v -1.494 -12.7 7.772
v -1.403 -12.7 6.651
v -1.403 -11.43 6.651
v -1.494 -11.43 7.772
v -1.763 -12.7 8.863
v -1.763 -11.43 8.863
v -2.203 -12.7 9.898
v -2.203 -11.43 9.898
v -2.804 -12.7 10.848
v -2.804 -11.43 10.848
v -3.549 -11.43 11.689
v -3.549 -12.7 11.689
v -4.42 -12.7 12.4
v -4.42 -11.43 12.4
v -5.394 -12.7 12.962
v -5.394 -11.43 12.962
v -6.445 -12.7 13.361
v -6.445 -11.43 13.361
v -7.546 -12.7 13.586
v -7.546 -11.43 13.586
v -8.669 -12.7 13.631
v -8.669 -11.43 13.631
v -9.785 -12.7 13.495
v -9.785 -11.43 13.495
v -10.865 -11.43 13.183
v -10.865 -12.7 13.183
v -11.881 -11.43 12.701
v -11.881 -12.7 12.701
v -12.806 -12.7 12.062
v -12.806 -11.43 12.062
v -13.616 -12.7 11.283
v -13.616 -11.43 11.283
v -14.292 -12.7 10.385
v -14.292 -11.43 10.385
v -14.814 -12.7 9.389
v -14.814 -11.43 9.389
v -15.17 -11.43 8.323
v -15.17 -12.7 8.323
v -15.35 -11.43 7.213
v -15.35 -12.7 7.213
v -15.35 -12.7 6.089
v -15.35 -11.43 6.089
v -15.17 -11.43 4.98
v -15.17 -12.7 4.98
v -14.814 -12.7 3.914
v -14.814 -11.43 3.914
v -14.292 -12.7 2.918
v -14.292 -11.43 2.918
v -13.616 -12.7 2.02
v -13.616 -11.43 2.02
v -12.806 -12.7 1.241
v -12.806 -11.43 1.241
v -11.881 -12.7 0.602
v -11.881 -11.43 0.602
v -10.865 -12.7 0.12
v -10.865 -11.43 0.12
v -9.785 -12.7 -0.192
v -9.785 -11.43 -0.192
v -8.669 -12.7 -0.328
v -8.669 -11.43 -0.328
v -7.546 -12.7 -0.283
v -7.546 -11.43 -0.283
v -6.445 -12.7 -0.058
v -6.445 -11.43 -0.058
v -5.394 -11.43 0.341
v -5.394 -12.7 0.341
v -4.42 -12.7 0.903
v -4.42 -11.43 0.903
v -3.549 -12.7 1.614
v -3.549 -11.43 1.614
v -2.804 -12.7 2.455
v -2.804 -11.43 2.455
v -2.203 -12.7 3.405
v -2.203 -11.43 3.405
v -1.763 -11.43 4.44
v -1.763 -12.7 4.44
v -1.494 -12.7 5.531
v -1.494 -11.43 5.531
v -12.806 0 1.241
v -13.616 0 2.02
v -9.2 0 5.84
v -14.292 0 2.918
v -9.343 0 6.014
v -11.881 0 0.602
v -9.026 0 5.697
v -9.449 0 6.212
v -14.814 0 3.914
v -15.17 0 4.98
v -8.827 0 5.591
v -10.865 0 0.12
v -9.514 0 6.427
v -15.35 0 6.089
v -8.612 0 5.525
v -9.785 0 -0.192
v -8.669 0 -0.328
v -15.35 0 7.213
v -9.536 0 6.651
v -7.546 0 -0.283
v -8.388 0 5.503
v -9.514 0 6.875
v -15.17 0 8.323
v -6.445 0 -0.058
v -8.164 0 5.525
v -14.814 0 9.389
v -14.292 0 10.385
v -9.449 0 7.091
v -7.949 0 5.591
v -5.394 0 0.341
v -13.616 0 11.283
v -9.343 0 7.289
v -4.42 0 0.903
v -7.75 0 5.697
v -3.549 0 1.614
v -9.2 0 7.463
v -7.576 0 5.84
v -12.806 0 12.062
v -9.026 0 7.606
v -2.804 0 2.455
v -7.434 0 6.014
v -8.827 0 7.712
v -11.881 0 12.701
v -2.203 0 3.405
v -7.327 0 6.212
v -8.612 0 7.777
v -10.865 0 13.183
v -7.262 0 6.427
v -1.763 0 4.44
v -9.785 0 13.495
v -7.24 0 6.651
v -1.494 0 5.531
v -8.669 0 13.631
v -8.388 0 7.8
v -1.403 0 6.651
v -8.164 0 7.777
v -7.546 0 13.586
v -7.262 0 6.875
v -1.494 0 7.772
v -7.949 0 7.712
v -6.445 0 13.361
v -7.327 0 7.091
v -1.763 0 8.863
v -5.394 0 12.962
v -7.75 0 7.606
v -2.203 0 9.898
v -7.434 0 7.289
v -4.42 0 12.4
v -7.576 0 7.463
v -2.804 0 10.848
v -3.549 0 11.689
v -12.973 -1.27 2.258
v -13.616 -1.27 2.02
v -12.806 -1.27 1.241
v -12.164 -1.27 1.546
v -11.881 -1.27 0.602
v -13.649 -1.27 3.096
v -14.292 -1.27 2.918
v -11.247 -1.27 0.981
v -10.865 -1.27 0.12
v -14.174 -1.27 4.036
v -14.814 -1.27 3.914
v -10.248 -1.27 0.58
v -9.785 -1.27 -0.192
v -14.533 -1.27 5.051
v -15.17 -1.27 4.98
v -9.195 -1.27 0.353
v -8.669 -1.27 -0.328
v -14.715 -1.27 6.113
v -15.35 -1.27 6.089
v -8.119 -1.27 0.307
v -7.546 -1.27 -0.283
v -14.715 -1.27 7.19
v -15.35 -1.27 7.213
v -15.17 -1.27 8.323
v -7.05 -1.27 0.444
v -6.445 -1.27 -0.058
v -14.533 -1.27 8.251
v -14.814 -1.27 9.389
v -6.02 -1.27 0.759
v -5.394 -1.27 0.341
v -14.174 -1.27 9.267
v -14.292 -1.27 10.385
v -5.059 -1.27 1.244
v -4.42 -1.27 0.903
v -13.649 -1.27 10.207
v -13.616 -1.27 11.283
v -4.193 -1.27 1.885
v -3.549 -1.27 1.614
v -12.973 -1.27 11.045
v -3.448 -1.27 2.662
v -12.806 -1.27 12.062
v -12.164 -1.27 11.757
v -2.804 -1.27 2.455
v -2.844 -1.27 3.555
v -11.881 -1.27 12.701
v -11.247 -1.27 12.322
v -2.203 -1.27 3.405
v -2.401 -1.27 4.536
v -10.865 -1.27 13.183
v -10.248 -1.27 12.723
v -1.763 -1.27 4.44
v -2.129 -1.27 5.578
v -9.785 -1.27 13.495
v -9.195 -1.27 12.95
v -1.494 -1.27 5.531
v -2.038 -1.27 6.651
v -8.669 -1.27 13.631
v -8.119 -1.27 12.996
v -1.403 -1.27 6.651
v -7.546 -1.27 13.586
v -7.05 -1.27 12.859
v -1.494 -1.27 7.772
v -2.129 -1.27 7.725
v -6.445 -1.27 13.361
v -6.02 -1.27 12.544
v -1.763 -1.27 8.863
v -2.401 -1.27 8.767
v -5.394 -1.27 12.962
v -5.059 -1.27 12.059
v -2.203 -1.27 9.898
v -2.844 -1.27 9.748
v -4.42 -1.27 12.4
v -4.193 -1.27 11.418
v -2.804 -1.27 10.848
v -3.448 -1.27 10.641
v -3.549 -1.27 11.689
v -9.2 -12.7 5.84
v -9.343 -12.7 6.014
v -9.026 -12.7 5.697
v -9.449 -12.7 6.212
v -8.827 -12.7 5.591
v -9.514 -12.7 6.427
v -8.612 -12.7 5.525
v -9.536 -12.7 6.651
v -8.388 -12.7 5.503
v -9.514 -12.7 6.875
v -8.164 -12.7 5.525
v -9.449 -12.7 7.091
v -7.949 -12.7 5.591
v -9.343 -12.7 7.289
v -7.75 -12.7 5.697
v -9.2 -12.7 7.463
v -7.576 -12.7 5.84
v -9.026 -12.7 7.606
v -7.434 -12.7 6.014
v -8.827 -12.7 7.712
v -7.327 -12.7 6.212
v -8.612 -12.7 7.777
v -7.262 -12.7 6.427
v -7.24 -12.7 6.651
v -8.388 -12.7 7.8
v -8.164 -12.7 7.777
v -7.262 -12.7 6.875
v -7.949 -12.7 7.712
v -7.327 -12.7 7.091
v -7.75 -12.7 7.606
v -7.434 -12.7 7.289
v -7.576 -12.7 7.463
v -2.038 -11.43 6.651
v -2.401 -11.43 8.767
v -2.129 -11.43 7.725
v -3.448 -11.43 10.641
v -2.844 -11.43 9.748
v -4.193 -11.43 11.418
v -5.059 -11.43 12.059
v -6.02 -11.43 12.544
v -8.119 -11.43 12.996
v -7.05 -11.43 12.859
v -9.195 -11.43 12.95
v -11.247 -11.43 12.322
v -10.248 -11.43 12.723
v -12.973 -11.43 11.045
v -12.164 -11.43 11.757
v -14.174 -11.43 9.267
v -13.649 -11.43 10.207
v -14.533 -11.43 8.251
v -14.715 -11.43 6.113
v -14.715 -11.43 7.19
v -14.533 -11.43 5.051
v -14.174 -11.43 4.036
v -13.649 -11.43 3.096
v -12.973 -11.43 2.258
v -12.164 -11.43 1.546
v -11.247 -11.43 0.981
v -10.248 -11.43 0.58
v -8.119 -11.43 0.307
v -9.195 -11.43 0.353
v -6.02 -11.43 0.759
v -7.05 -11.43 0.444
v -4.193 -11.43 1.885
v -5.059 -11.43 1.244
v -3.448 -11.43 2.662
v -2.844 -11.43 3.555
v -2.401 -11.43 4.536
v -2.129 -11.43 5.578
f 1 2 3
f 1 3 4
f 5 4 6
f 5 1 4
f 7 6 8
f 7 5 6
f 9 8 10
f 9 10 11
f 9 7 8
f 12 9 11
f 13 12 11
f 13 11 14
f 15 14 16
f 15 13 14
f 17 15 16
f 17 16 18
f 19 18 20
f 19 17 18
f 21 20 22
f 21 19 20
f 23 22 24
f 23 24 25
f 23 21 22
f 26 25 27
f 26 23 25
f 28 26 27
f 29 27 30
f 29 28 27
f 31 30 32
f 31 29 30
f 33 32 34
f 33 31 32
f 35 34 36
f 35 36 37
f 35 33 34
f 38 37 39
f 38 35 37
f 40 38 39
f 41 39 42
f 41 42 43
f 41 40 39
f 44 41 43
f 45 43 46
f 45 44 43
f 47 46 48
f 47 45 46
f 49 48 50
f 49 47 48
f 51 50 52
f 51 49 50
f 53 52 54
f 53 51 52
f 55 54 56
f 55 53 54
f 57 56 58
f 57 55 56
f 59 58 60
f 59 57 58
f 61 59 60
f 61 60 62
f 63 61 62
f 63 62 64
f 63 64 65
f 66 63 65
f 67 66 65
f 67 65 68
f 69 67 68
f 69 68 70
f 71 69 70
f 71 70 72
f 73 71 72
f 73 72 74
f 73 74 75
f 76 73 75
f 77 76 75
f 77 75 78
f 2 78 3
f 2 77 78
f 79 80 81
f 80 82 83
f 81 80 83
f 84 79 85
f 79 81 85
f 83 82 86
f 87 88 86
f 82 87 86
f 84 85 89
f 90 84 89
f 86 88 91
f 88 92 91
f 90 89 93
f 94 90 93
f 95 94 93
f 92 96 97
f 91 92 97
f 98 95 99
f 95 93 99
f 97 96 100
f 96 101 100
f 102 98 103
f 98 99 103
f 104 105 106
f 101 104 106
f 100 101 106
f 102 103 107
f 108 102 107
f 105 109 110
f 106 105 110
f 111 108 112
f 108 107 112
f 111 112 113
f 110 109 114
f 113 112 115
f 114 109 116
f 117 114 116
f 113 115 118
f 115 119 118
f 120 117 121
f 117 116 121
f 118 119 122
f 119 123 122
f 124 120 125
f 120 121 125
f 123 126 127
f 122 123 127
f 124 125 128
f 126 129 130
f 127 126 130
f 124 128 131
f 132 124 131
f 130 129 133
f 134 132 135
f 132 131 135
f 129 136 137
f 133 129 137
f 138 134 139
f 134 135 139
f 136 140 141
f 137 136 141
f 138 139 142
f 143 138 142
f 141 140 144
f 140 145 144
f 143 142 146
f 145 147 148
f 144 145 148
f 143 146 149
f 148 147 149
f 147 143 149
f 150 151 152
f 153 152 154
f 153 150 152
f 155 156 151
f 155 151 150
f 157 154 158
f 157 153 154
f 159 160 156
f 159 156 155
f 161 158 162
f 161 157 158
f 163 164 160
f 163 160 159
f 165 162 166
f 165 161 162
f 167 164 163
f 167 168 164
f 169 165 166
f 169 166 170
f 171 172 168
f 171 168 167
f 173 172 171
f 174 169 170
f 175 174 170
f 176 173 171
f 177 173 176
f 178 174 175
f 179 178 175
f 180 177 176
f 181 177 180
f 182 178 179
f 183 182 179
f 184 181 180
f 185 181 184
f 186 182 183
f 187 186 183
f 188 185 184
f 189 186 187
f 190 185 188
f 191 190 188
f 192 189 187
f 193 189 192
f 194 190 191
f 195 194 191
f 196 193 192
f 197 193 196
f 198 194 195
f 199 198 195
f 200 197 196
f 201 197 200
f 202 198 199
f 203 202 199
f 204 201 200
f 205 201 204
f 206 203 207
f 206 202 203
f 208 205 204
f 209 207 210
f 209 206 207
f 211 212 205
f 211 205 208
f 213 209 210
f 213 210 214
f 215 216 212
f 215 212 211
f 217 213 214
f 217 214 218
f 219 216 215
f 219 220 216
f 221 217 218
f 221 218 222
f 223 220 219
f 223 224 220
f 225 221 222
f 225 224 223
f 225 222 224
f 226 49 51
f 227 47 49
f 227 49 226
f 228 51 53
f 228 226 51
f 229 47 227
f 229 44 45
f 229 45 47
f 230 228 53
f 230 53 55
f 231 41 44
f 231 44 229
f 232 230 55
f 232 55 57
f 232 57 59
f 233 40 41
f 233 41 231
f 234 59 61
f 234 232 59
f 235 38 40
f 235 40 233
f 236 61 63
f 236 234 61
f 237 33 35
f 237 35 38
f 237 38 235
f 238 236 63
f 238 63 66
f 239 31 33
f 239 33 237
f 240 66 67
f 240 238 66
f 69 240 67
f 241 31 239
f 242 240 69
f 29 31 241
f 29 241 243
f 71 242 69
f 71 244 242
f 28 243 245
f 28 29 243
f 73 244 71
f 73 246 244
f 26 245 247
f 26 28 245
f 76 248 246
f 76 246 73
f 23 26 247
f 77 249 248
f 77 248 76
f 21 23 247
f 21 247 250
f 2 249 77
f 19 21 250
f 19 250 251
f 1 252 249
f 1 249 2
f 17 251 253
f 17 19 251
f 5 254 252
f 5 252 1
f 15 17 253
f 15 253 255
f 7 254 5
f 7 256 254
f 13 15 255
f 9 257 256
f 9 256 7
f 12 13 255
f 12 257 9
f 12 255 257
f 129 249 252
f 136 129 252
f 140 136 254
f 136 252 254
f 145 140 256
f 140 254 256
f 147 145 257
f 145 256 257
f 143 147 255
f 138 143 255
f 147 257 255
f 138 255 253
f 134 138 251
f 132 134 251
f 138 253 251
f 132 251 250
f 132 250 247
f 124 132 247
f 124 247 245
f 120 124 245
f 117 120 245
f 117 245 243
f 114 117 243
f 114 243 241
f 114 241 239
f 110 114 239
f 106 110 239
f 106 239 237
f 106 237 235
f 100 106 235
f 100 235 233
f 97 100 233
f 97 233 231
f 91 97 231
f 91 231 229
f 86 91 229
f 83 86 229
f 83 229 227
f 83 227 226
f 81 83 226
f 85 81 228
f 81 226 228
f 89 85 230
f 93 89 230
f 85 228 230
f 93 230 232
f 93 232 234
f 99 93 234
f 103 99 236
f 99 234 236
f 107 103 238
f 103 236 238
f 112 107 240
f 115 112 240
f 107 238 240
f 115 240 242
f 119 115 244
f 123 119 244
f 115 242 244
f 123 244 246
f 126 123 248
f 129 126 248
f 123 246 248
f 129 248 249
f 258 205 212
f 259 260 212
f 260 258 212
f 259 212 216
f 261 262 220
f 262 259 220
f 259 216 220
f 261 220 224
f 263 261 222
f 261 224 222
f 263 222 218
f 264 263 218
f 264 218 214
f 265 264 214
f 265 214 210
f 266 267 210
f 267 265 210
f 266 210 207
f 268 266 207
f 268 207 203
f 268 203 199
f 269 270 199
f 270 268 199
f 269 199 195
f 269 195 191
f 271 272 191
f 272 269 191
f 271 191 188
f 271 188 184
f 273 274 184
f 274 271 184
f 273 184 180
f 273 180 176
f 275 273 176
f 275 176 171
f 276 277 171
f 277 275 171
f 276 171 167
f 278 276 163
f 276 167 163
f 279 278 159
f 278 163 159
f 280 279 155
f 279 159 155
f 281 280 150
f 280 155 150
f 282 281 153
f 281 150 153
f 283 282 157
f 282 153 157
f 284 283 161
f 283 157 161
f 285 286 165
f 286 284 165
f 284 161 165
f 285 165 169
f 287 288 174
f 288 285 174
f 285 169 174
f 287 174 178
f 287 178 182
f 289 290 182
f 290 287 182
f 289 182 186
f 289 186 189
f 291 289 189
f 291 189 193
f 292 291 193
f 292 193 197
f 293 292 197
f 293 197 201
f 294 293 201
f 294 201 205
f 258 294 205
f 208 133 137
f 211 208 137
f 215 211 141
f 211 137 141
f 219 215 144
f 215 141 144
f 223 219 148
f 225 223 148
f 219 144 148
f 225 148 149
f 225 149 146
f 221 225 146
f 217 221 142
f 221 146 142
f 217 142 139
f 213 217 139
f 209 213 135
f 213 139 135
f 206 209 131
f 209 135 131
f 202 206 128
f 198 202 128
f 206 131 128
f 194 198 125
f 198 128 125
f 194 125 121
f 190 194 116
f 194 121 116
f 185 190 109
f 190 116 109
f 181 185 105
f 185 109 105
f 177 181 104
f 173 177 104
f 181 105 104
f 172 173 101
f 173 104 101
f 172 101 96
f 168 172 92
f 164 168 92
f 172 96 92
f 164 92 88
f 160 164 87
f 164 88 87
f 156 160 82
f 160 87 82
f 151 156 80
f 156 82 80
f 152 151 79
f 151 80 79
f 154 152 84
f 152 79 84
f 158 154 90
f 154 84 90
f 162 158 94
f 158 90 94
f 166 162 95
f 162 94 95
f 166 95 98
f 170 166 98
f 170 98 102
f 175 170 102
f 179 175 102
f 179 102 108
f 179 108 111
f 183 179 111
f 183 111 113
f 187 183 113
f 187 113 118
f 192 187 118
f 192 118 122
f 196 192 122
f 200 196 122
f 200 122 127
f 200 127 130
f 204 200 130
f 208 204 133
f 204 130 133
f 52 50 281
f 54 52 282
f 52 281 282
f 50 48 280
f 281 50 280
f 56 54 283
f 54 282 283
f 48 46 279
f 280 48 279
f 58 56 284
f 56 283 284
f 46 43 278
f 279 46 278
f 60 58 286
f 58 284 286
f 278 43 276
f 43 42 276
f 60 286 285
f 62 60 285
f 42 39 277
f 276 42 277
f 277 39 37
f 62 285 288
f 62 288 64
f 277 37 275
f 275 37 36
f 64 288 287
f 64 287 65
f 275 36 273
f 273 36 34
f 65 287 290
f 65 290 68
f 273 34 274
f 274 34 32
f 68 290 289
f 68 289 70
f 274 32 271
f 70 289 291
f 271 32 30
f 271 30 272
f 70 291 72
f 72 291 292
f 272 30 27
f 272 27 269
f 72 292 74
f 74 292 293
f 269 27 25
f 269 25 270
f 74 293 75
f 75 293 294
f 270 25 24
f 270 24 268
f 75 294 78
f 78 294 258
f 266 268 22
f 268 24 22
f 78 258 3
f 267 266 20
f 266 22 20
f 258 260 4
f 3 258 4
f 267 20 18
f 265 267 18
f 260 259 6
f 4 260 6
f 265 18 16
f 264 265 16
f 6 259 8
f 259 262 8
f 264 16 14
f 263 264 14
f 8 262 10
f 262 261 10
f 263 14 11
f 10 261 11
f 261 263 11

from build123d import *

# Parameters (mm, degrees)
F0_R     = 6.35
F1_DEPTH = 12.7
F2_R     = 6.985
F3_DEPTH = 1.27
F4_R     = 6.985
F5_DEPTH = 1.27
F6_R     = 1.14808
F7_DEPTH = 25.4


with BuildPart() as f1:
    # F0 (on Front) → F1 (new body)
    with BuildSketch(Plane.XZ):
        with Locations((-8.3881383762, 6.6514373757)):
            Circle(F0_R)
    extrude(amount=F1_DEPTH)

    # F2 (on face) → F3 (join)
    with BuildSketch(Plane.XZ.offset(12.7)):
        with Locations((-8.3881383762, 6.6514373757)):
            Circle(F2_R)
    extrude(amount=-F3_DEPTH)

    # F4 (on Front) → F5 (join)
    with BuildSketch(Plane.XZ):
        with Locations((-8.3881383762, 6.6514373757)):
            Circle(F4_R)
    extrude(amount=F5_DEPTH)

    # F6 (on face) → F7 (cut)
    with BuildSketch(Plane.XZ.offset(12.7)):
        with Locations((-8.3881383762, 6.6514373757)):
            Circle(F6_R)
    extrude(amount=-F7_DEPTH, mode=Mode.SUBTRACT)


solid = f1.part
